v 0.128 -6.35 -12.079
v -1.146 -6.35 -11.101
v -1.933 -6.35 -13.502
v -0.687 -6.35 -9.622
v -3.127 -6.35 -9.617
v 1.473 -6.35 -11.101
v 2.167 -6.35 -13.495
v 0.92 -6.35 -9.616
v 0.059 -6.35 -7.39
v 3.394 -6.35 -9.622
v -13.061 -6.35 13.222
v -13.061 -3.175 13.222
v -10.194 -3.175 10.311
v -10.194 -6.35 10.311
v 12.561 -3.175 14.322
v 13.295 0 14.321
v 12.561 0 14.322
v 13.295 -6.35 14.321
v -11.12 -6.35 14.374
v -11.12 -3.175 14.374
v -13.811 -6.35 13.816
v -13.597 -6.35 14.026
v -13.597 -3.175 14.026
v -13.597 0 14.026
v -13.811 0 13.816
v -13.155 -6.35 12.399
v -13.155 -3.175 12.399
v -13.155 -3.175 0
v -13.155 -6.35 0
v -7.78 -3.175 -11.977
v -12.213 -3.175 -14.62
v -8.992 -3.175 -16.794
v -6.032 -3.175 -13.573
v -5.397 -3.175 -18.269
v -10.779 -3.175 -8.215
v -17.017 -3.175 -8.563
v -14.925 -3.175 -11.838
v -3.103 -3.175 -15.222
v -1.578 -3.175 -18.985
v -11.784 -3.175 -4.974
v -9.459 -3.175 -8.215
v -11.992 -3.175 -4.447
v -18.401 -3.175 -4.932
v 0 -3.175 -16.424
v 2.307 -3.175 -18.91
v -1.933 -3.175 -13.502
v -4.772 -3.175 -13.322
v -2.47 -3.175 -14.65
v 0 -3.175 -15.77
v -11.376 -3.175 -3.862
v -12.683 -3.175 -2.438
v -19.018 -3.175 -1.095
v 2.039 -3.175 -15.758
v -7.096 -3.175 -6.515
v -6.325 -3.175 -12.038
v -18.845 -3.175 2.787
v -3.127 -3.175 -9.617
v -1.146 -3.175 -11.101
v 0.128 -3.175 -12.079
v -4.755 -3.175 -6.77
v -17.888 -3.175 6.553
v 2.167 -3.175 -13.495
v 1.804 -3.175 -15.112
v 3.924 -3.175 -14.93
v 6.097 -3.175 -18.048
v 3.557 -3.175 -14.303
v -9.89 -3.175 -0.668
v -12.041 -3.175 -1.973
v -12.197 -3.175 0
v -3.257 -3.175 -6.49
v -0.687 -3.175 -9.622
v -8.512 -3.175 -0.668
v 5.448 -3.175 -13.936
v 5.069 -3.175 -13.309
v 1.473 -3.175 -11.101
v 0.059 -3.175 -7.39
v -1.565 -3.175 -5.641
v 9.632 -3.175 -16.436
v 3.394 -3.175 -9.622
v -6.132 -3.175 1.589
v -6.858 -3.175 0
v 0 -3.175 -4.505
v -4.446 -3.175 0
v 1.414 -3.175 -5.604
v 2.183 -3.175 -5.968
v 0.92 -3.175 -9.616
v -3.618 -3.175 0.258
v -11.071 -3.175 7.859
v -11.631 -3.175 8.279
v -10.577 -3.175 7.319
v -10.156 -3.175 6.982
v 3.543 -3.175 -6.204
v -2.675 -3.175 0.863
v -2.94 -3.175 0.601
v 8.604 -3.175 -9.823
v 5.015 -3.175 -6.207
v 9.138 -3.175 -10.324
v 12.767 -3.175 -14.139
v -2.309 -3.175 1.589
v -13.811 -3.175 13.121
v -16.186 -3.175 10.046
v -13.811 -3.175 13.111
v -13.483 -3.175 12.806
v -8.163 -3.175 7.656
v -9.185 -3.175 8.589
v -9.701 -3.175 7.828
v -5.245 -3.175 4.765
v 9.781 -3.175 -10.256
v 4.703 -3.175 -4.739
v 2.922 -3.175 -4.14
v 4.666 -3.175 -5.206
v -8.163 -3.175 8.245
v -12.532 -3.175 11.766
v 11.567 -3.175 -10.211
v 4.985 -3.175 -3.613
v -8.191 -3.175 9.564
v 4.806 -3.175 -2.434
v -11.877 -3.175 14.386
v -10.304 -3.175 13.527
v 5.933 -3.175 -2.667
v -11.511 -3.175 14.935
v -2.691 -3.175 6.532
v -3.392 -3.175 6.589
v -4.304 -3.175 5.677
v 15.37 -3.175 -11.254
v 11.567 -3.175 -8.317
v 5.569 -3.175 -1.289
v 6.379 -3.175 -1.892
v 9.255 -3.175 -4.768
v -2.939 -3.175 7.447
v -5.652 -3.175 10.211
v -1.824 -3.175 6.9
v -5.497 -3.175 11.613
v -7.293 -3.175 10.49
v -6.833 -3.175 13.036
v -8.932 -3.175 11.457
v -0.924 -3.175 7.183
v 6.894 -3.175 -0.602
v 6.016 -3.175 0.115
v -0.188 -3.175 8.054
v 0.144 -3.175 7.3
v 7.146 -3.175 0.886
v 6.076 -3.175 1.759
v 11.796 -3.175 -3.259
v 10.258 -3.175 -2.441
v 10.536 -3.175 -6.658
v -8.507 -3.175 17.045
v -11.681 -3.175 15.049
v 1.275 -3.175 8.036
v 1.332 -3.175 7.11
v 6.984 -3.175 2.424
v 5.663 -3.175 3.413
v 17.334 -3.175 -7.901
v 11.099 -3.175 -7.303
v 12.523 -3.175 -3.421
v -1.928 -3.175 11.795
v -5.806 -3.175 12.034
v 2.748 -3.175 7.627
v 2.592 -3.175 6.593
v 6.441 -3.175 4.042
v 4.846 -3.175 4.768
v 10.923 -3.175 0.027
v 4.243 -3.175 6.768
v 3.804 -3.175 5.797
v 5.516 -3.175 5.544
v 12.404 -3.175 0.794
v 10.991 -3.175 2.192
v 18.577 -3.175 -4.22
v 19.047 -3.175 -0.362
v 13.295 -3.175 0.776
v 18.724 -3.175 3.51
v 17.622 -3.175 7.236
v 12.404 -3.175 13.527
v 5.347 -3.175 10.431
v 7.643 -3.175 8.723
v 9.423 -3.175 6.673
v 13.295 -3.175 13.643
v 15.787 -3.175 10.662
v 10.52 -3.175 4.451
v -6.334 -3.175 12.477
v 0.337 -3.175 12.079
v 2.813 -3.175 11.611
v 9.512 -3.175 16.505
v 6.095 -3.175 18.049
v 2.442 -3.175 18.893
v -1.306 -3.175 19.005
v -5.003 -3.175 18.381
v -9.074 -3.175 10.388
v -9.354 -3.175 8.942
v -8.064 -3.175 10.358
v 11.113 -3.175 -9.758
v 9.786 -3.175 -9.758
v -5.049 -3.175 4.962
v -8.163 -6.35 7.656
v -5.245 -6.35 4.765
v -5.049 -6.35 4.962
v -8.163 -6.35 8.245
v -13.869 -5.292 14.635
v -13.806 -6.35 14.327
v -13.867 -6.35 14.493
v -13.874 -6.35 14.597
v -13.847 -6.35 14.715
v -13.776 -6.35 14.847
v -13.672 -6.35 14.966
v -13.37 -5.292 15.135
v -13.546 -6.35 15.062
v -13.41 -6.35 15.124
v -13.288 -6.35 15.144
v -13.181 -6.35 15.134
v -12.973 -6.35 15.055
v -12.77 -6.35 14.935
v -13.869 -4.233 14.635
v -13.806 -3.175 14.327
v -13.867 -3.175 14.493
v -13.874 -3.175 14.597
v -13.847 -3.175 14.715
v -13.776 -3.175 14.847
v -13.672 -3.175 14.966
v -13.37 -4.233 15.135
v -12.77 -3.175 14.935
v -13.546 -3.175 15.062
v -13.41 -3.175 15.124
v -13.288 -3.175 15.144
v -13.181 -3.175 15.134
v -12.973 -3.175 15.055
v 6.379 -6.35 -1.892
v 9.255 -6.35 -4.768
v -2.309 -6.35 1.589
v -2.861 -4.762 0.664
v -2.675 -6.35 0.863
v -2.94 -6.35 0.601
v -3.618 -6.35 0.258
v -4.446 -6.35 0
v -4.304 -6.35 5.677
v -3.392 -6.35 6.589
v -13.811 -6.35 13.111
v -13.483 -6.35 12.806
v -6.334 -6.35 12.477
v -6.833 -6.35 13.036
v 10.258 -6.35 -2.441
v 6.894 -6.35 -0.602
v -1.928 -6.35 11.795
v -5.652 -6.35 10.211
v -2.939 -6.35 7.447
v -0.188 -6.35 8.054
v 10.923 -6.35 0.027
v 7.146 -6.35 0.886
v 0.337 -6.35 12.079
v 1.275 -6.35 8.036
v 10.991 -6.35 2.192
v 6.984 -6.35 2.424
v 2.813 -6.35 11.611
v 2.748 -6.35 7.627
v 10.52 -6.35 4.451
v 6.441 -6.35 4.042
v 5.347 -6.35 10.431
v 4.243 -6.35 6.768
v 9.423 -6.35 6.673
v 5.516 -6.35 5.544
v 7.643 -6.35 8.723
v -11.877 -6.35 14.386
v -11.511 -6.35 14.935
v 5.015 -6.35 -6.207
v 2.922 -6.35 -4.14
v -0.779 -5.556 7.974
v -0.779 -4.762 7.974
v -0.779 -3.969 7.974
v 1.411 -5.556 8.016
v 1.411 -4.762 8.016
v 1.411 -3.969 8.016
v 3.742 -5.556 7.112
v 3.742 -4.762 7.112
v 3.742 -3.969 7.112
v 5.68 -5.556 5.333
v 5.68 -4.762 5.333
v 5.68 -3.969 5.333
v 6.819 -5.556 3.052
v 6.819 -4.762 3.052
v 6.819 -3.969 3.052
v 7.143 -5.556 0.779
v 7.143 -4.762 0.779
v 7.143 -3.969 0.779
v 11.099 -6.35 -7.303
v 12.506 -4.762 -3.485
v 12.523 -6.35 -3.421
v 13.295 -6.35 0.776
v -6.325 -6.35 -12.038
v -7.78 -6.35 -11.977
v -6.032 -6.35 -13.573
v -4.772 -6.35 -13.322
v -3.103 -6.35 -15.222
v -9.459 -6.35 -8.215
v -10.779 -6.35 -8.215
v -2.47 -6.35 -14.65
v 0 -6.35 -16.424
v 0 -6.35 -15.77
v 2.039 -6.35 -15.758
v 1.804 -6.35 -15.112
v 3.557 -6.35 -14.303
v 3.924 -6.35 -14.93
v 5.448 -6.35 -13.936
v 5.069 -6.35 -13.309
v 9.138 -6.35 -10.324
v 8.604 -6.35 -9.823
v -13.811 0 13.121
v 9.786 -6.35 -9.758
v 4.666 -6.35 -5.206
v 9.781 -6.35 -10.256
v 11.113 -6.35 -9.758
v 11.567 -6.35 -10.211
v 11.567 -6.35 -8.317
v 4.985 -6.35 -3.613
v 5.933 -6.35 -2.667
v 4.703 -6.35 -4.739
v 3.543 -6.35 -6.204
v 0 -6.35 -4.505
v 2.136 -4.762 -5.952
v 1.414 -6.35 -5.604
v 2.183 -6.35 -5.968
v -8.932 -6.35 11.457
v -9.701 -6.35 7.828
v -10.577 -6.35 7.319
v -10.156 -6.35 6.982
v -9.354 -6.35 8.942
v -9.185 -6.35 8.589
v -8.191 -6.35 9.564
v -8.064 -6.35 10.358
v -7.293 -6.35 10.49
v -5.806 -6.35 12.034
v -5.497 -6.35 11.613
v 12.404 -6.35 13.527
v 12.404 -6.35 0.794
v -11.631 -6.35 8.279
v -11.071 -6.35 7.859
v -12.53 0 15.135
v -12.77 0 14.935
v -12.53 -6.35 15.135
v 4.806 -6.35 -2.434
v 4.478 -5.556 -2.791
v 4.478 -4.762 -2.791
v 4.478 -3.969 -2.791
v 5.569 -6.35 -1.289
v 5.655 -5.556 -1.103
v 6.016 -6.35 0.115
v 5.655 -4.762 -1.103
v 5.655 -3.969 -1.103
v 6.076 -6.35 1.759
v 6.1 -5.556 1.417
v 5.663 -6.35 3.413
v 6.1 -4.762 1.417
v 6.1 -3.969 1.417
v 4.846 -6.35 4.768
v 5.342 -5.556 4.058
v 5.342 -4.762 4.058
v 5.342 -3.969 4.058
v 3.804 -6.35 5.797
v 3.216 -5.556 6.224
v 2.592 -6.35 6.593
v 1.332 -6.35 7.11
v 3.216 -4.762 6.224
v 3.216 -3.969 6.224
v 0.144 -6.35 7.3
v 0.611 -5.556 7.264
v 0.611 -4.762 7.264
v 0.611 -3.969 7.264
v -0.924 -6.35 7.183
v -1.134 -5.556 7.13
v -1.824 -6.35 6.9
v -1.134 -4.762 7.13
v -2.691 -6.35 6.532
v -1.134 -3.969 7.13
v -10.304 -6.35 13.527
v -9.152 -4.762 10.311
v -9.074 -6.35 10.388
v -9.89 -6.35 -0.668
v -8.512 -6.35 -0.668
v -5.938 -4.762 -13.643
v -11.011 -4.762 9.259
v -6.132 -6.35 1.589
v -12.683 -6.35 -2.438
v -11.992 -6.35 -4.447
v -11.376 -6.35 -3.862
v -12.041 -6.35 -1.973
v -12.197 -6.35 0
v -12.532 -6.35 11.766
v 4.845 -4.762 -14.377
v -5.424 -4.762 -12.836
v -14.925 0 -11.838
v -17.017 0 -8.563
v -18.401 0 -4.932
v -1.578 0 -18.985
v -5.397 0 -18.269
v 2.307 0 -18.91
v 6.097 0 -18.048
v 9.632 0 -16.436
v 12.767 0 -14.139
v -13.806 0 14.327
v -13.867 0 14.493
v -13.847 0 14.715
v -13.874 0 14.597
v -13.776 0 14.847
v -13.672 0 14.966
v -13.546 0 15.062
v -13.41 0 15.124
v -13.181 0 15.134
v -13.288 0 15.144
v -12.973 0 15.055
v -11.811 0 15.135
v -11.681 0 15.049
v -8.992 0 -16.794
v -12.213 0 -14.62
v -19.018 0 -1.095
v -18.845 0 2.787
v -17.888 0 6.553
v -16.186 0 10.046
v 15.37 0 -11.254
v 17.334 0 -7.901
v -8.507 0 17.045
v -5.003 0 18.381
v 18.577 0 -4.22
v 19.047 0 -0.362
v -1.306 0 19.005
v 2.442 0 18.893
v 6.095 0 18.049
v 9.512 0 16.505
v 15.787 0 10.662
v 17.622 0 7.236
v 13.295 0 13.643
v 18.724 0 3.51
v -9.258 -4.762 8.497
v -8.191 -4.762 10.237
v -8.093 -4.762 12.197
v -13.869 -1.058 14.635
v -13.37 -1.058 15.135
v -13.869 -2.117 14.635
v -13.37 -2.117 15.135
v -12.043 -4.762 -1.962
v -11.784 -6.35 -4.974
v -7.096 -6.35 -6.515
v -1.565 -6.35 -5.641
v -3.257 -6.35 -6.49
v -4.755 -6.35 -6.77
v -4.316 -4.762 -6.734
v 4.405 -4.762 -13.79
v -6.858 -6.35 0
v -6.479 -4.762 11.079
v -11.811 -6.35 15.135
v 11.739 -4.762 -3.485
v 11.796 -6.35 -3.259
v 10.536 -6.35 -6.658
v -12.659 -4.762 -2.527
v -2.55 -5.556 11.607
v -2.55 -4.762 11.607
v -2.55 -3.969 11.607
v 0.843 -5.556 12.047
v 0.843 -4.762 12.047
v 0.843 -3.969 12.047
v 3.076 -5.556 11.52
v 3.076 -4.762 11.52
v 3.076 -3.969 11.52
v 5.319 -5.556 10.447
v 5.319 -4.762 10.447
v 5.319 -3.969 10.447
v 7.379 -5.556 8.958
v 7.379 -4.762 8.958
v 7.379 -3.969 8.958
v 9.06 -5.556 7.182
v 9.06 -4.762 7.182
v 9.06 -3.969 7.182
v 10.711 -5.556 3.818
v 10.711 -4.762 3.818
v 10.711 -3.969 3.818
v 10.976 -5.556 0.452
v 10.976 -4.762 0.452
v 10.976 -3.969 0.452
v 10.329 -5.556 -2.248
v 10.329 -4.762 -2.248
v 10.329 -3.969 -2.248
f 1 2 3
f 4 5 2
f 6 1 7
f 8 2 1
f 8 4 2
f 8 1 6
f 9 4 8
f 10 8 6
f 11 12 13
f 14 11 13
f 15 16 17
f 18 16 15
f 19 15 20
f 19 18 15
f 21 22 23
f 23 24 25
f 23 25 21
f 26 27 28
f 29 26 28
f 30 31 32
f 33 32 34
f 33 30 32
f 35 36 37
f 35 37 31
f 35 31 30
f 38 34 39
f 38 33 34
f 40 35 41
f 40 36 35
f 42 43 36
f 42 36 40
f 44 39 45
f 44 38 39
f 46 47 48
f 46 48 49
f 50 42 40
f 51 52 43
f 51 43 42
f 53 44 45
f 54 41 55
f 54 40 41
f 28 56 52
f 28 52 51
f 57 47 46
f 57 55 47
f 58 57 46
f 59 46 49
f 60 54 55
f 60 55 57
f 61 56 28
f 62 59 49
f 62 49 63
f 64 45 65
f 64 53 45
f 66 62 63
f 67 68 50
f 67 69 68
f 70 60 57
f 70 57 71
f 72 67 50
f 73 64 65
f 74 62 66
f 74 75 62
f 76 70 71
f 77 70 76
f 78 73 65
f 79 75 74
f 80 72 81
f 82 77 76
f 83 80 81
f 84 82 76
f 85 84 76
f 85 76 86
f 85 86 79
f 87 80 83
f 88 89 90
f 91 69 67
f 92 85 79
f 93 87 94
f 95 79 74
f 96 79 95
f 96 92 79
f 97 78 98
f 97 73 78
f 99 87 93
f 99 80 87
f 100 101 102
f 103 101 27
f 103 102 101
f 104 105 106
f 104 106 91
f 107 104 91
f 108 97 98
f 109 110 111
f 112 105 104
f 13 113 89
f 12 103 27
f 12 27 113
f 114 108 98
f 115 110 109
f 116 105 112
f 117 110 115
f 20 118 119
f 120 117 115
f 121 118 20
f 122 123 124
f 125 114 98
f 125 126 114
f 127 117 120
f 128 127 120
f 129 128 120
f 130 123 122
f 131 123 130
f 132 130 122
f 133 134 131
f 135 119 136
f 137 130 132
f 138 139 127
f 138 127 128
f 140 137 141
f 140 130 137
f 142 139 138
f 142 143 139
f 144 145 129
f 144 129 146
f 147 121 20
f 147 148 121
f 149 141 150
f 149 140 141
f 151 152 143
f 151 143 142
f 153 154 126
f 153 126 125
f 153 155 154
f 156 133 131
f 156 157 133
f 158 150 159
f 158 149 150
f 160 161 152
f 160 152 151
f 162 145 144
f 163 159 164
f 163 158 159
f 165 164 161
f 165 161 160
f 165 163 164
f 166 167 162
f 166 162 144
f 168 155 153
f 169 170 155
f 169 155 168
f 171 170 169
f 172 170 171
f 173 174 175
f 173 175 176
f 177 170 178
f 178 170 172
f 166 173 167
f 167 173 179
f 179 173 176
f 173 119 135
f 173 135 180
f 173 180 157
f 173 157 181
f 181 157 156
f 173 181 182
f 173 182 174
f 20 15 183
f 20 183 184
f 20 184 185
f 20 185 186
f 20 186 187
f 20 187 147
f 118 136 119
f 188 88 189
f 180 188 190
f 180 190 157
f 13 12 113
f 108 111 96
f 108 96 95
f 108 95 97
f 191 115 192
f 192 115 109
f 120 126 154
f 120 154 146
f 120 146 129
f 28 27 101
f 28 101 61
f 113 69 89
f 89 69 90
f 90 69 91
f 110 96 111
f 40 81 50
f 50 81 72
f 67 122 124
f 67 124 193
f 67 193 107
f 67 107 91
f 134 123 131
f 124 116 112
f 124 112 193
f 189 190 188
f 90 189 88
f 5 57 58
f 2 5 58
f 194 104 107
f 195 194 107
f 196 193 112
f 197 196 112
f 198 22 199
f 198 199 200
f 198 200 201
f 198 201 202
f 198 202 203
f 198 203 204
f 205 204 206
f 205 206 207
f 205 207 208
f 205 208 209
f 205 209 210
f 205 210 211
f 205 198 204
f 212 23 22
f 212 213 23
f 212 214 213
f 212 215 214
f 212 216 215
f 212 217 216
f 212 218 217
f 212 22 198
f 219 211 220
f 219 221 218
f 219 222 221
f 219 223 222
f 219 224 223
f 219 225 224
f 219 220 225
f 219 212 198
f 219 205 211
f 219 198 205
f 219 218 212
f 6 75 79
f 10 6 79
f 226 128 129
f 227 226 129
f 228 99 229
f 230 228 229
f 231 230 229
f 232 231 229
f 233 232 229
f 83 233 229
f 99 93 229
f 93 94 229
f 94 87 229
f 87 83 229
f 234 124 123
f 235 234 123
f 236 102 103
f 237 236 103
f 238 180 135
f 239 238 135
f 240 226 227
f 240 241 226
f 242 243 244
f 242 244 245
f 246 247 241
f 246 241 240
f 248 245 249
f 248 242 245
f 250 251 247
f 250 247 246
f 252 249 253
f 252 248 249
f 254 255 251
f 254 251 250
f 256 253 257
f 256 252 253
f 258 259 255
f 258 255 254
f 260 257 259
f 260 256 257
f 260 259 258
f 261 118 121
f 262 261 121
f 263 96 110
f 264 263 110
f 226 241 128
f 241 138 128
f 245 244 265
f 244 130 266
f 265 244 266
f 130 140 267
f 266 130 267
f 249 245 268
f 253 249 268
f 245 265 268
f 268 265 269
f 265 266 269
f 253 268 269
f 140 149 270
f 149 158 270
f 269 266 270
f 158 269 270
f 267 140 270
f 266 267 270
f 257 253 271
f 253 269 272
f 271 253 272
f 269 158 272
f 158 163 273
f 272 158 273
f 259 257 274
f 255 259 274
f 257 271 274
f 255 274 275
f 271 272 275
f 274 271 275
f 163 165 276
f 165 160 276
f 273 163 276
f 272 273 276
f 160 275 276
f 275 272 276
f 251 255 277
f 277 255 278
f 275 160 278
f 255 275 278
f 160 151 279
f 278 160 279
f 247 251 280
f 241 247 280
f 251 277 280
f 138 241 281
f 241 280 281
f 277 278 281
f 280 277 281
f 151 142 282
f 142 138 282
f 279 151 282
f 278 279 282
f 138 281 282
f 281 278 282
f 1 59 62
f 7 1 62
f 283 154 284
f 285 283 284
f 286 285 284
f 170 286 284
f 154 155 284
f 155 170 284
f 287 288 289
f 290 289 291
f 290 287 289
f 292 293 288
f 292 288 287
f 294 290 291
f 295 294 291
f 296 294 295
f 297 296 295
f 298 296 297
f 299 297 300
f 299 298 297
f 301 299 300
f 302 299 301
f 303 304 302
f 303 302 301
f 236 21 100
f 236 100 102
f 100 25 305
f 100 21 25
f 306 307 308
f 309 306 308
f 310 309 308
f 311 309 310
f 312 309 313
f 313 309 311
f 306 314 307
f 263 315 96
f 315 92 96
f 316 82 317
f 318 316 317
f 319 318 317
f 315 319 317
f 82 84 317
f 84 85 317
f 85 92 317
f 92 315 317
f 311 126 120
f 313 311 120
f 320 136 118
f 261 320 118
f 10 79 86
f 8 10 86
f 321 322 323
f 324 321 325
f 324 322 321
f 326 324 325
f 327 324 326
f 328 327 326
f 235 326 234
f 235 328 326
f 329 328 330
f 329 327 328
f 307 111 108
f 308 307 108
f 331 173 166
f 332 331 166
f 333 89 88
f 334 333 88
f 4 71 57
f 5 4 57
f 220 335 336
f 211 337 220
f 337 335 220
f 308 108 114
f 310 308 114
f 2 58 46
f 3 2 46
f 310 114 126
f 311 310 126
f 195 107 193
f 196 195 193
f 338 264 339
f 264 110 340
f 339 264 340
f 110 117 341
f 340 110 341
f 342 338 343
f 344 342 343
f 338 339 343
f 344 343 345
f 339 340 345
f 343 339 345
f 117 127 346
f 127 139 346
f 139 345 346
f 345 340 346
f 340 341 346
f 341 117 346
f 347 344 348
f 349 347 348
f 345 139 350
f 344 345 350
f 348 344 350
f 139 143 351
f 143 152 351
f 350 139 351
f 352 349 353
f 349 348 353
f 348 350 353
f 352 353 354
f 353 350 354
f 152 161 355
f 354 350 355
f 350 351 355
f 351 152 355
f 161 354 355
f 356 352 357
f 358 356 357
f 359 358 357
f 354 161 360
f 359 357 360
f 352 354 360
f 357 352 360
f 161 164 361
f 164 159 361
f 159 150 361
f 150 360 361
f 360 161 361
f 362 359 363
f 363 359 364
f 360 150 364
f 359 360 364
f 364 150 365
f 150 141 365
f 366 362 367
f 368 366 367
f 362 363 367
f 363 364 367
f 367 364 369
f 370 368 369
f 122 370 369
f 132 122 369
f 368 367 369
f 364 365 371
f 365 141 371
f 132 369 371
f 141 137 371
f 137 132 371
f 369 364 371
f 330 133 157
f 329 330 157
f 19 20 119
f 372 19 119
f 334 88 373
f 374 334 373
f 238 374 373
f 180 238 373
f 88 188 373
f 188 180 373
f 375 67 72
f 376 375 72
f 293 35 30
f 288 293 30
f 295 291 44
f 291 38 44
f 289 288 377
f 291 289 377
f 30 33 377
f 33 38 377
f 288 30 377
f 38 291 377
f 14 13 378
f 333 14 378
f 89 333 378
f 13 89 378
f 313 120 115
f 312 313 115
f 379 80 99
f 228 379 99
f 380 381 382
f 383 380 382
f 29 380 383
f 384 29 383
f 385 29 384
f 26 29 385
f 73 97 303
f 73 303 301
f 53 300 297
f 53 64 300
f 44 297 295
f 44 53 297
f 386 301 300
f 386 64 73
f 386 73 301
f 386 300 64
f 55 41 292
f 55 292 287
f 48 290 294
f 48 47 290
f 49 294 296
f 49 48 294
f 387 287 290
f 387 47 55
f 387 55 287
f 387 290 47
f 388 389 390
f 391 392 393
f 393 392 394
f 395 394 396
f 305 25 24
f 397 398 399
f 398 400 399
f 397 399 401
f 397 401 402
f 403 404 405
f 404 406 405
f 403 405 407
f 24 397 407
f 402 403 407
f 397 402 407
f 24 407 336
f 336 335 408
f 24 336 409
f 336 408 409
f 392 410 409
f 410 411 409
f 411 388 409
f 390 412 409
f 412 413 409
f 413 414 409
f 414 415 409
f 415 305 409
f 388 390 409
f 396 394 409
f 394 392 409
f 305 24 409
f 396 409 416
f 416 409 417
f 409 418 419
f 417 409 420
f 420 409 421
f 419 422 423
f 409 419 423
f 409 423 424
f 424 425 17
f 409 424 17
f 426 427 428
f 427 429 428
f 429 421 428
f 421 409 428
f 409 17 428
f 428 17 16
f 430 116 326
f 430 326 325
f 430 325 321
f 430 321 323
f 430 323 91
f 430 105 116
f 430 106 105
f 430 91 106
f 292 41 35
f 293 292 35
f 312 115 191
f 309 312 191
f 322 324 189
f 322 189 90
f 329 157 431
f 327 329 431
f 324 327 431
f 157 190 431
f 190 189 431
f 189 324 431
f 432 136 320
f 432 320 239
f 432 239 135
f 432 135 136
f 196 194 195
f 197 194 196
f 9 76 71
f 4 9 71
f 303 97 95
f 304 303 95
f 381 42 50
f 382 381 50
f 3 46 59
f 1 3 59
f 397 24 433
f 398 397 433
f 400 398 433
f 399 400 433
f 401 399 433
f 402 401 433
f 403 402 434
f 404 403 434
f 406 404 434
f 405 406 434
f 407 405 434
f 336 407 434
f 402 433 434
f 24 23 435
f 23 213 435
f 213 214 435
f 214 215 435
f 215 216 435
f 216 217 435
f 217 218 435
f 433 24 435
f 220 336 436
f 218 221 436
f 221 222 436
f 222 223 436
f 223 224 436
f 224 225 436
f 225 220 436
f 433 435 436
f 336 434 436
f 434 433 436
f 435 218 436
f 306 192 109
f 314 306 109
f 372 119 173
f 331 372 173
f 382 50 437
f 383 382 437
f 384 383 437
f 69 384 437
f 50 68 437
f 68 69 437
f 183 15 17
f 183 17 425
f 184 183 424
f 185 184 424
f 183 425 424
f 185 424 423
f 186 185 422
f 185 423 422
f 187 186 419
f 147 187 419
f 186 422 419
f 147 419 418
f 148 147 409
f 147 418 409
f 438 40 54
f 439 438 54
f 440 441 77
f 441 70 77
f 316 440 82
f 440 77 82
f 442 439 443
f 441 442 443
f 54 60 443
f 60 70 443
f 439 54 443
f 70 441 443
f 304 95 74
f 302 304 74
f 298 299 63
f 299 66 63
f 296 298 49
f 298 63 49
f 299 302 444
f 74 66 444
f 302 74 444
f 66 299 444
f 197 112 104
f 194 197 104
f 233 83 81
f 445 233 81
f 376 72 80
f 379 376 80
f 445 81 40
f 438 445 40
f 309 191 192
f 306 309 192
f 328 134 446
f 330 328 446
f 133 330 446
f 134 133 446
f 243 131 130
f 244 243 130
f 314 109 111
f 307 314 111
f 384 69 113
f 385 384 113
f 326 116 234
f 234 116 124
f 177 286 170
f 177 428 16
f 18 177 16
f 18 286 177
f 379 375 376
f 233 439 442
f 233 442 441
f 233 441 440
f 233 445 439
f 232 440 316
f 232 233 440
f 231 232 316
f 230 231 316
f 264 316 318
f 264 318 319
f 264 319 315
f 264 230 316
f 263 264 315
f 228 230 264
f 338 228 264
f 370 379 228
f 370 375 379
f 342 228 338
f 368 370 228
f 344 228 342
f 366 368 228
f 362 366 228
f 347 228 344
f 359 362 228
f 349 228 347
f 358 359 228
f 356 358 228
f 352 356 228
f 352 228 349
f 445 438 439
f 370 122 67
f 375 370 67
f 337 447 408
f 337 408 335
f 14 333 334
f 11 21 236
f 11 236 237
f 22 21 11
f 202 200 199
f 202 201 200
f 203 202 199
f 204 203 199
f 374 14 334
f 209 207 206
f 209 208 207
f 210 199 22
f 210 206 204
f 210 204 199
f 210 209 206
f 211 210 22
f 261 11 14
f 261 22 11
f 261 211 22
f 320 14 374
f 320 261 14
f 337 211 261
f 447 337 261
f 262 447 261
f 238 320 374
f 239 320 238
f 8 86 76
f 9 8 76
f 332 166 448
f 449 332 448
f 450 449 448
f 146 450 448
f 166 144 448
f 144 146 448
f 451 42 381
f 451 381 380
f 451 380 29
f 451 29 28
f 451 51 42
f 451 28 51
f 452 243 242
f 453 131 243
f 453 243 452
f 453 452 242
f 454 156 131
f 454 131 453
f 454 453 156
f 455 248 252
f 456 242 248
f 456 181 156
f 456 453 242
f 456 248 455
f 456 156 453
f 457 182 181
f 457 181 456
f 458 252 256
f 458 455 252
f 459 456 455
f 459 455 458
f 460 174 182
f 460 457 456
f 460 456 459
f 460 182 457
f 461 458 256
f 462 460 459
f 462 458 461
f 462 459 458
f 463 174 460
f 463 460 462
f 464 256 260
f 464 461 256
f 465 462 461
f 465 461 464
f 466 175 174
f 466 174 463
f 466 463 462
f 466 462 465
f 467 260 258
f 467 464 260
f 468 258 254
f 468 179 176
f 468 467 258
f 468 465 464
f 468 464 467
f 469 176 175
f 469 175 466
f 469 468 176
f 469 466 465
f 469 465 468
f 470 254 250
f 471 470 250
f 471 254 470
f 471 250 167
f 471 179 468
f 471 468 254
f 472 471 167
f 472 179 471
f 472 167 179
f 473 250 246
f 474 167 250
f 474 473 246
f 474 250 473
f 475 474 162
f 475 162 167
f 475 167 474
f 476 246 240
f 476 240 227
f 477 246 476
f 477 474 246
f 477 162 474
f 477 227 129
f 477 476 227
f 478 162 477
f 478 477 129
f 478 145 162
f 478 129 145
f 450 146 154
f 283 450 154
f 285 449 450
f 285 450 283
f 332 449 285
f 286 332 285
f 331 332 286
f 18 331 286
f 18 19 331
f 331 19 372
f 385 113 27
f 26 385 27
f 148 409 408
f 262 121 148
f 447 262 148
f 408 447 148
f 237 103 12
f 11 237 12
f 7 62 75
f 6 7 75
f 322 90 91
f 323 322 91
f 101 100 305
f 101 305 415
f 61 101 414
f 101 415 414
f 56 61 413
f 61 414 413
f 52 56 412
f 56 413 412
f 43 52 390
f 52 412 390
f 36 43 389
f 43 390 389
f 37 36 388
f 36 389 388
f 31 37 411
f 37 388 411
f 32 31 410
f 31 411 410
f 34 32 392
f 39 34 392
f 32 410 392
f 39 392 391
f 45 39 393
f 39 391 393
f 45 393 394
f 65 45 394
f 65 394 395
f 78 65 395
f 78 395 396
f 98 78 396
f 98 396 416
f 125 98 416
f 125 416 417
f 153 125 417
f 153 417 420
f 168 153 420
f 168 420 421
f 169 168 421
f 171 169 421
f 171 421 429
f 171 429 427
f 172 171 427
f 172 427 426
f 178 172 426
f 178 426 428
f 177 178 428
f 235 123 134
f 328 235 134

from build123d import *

# Parameters (mm, degrees)
F0_R          = 19.05
F1_DEPTH      = 3.175
F3_DEPTH      = 3.175
F3_DEPTH_BACK = 3.175


with BuildPart() as f1:
    # F0 (on Front) → F1 (new body)
    with BuildSketch(Plane.XZ):
        Circle(F0_R)
    extrude(amount=F1_DEPTH)

    # F2 (on face) → F3 (join, two sides)
    with BuildSketch(Plane.XZ.offset(3.175)) as f3_sk:
        with BuildLine():
            Line((13.2951065898, 14.3205206841), (-11.1195538193, 14.3741192296))
            Line((-11.1195538193, 14.3741192296), (-10.3040672839, 13.5272685438))
            Line((-10.3040672839, 13.5272685438), (12.4042537063, 13.5272685438))
            Line((12.4042537063, 13.5272685438), (12.4042537063, 0.7942219963))
            add(Edge.make_bspline(
                [(12.4042537063, 0.7942219963), (12.2437335062, -0.6935312294), (11.9411104332, -3.4983399235), (10.9847031297, -5.6485725407), (10.5356024578, -6.6582583822)],
                knots=[0, 0, 0, 0, 0.5304294831, 1, 1, 1, 1], degree=3))
            Line((10.5356024578, -6.6582583822), (11.0988598317, -7.3030013591))
            add(Edge.make_bspline(
                [(11.0988598317, -7.3030013591), (11.6204761786, -6.0557843594), (12.6803886436, -3.521467994), (13.0880620978, -0.6713659701), (13.2951065898, 0.7761109737)],
                knots=[0, 0, 0, 0, 0.4921315337, 1, 1, 1, 1], degree=3))
            Line((13.2951065898, 0.7761109737), (13.2951065898, 14.3205206841))
        make_face()
        Polygon((-0.6866836248, -9.621998817), (-3.1270722393, -9.6166413277), (-1.1461181566, -11.1010298133), (-1.9328042399, -13.5020688176), (0.1275643008, -12.078541331), (2.1668851841, -13.4953176603), (1.4733931748, -11.1010298133), (3.3938813927, -9.6218636439), (0.9196144529, -9.6164317802), (0.0594901867, -7.3895342648), align=None)
        Polygon((9.7805182455, -10.2559360764), (11.5665001795, -10.2110812441), (11.5665001795, -8.3170095459), (5.9328516945, -2.6671725791), (4.9845642127, -3.6127429321), (11.1126137586, -9.7584016382), (9.7857490182, -9.7584016382), (4.7025149688, -4.7393189743), (4.6662185341, -5.2061798051), align=None)
        with BuildLine():
            Line((5.0151818607, -6.2073378134), (2.9217640404, -4.1403393261))
            add(Edge.make_bspline(
                [(2.9217640404, -4.1403393261), (4.0017596573, -3.2783505651), (6.2967614913, -1.4466155502), (6.3046824324, 4.5741096828), (0.6642850808, 8.0186176921), (-1.6742123718, 6.9825088021), (-2.6909445878, 6.5320292488)],
                knots=[0, 0, 0, 0, 0.2371028445, 0.503845992, 0.7842820981, 1, 1, 1, 1], degree=3))
            Line((-2.6909445878, 6.5320292488), (-9.8898978904, -0.6679674261))
            Line((-9.8898978904, -0.6679674261), (-8.5116093978, -0.6679674261))
            Line((-8.5116093978, -0.6679674261), (-6.13187678, 1.5893031363))
            Line((-6.13187678, 1.5893031363), (-2.3093123455, 1.5893031363))
            add(Edge.make_bspline(
                [(-2.3093123455, 1.5893031363), (-2.4412960331, 1.2516102423), (-2.7400240864, 0.4872859334), (-3.8346557693, 0.1745585357), (-4.445658531, 0)],
                knots=[0, 0, 0, 0, 0.441818859, 1, 1, 1, 1], degree=3))
            Line((-4.445658531, 0), (-6.857663393, 0))
            Line((-6.857663393, 0), (-11.7843858898, -4.9744602293))
            add(Edge.make_bspline(
                [(-11.7843858898, -4.9744602293), (-9.1052590566, -5.9842742459), (-4.2944262342, -7.7975689191), (-1.3186032332, -5.5161550663), (0, -4.5052482747)],
                knots=[0, 0, 0, 0, 0.5568946027, 1, 1, 1, 1], degree=3))
            add(Edge.make_bspline(
                [(0, -4.5052482747), (0.6645308371, -5.0850922819), (2.0325680841, -6.2787888796), (4.0022715592, -6.2316029467), (5.0151818607, -6.2073378134)],
                knots=[0, 0, 0, 0, 0.48575493, 1, 1, 1, 1], degree=3))
        make_face()
        with BuildLine():
            Line((9.138203226, -10.324401781), (8.6039779708, -9.8225530237))
            add(Edge.make_bspline(
                [(8.6039779708, -9.8225530237), (7.2581361134, -11.3018518624), (4.6817260383, -14.1337450832), (1.5133218063, -15.2414152892), (0, -15.7704707235)],
                knots=[0, 0, 0, 0, 0.5223709806, 1, 1, 1, 1], degree=3))
            add(Edge.make_bspline(
                [(-9.4586806372, -8.2151796669), (-8.2283692319, -9.8966299336), (-5.7644876665, -13.2639841641), (-1.9231894023, -14.9342388384), (0, -15.7704707235)],
                knots=[0, 0, 0, 0, 0.4993386949, 1, 1, 1, 1], degree=3))
            Line((-9.4586806372, -8.2151796669), (-10.7790241018, -8.2151796669))
            add(Edge.make_bspline(
                [(-10.7790241018, -8.2151796669), (-9.2866257772, -10.216307173), (-6.422821017, -14.1998498946), (-1.9977948837, -15.6756193291), (0, -16.4241865277)],
                knots=[0, 0, 0, 0, 0.5129628819, 1, 1, 1, 1], degree=3))
            add(Edge.make_bspline(
                [(9.138203226, -10.324401781), (7.6101712009, -11.8742374182), (5.1667983891, -14.7564398611), (1.7739776455, -15.8896886405), (0, -16.4241865277)],
                knots=[0, 0, 0, 0, 0.5144292418, 1, 1, 1, 1], degree=3))
        make_face()
        with BuildLine():
            Line((6.3793524168, -1.8924199976), (9.2547759414, -4.7678421251))
            add(Edge.make_bspline(
                [(-5.6524286047, 10.2112814784), (-3.6168299799, 11.2475901318), (0.8400975189, 13.5165799408), (10.0967712781, 7.8999192805), (11.6439949159, 0.4259003835), (10.018497176, -3.1076462689), (9.2547759414, -4.7678421251)],
                knots=[0, 0, 0, 0, 0.2433038431, 0.5327118892, 0.7804501082, 1, 1, 1, 1], degree=3))
            Line((-5.6524286047, 10.2112814784), (-2.9393755831, 7.4468469247))
            add(Edge.make_bspline(
                [(-2.9393755831, 7.4468469247), (-1.502485499, 7.851908623), (1.4748090248, 8.691212888), (6.2073016389, 5.7823119551), (7.5729609076, 0.7932677253), (6.7397473926, -1.0815105835), (6.3793524168, -1.8924199976)],
                knots=[0, 0, 0, 0, 0.255622974, 0.5296611682, 0.7965614469, 1, 1, 1, 1], degree=3))
        make_face()
        with BuildLine():
            Line((-3.3923503943, 6.5891323611), (-7.2932774201, 10.4900589213))
            add(Edge.make_bspline(
                [(-7.2932774201, 10.4900589213), (-7.0315208484, 10.6933025832), (-6.4937056941, 11.1108948549), (-5.835183803, 11.4424450599), (-5.4971668869, 11.6126285866)],
                knots=[0, 0, 0, 0, 0.4867035999, 1, 1, 1, 1], degree=3))
            Line((-5.4971668869, 11.6126285866), (-5.8058733121, 12.0335919783))
            add(Edge.make_bspline(
                [(-5.8058733121, 12.0335919783), (-6.6216145688, 11.4978026508), (-8.3538851706, 10.3600250858), (-9.8076282699, 8.3711164696), (-10.57679113, 7.3188021779)],
                knots=[0, 0, 0, 0, 0.4709086767, 1, 1, 1, 1], degree=3))
            Line((-10.57679113, 7.3188021779), (-10.1558286697, 6.9820312783))
            add(Edge.make_bspline(
                [(-8.1913326934, 9.5639401115), (-8.5656748556, 9.2353572907), (-9.3445869881, 8.5516588682), (-9.8785080222, 7.5186039785), (-10.1558286697, 6.9820312783)],
                knots=[0, 0, 0, 0, 0.4805961373, 1, 1, 1, 1], degree=3))
            Line((-8.1913326934, 9.5639401115), (-4.3044373822, 5.6770452643))
            Line((-4.3044373822, 5.6770452643), (-3.3923503943, 6.5891323611))
        make_face()
        Polygon((-5.0493629472, 4.9620792635), (-8.1632686779, 8.2449214533), (-8.1632686779, 7.6555726118), (-5.2445889451, 4.7649578191), align=None)
        with BuildLine():
            Line((-13.060814701, 13.2216596976), (-10.1942410693, 10.310985148))
            add(Edge.make_bspline(
                [(-10.1942410693, 10.310985148), (-10.4796394205, 9.9599556602), (-11.0312334616, 9.2815152529), (-11.4355277717, 8.6053887276), (-11.6306375712, 8.2790944725)],
                knots=[0, 0, 0, 0, 0.5174065165, 1, 1, 1, 1], degree=3))
            Line((-11.6306375712, 8.2790944725), (-11.0709676519, 7.8593418002))
            add(Edge.make_bspline(
                [(-11.0709676519, 7.8593418002), (-10.4892649761, 8.7107849431), (-9.2860247818, 10.4719778261), (-7.3393330178, 11.7938171812), (-6.3337632455, 12.4766174704)],
                knots=[0, 0, 0, 0, 0.4834468451, 1, 1, 1, 1], degree=3))
            Line((-6.3337632455, 12.4766174704), (-6.8334685639, 13.0362873897))
            add(Edge.make_bspline(
                [(-8.9322291315, 11.4572187886), (-8.6711328955, 11.7051084023), (-8.1063637602, 12.2413107045), (-7.2785688232, 12.7583035228), (-6.8334685639, 13.0362873897)],
                knots=[0, 0, 0, 0, 0.4623061346, 1, 1, 1, 1], degree=3))
            Line((-8.9322291315, 11.4572187886), (-11.8766472151, 14.3862600113))
            Line((-11.8766472151, 14.3862600113), (-11.5107083693, 14.935166575))
            Line((-11.5107083693, 14.935166575), (-11.8105309084, 15.1350488886))
            Line((-11.8105309084, 15.1350488886), (-12.5301061198, 15.1350488886))
            Line((-12.5301061198, 15.1350488886), (-12.7699645236, 14.935166575))
            add(Edge.make_bspline(
                [(-13.5973577846, 14.0257730544), (-13.7529213261, 14.2245779674), (-14.0633906595, 14.629918389), (-13.3650961838, 15.3086328914), (-12.9646191681, 15.0573192984), (-12.7699645236, 14.935166575)],
                knots=[0.0055616399, 0.0055616399, 0.0055616399, 0.0055616399, 0.3351525481, 0.6768462626, 1, 1, 1, 1], degree=3))
            Line((-13.5973577846, 14.0257730544), (-13.8105340302, 13.8158267364))
            Line((-13.8105340302, 13.8158267364), (-13.8105340302, 13.1114069372))
            Line((-13.8105340302, 13.1114069372), (-13.483288508, 12.8055869782))
            Line((-13.483288508, 12.8055869782), (-13.060814701, 13.2216596976))
        make_face()
        with BuildLine():
            Line((-13.1551567465, 12.3992469162), (-13.1551567465, 11.7663224228))
            Line((-13.1551567465, 11.7663224228), (-13.1551567465, 0))
            add(Edge.make_bspline(
                [(-11.9918715209, -4.4467356056), (-12.2321727364, -3.8322497133), (-12.7429395262, -2.5261431838), (-13.0124455989, -0.8745602441), (-13.1551567465, 0)],
                knots=[0, 0, 0, 0, 0.4704714955, 1, 1, 1, 1], degree=3))
            Line((-11.9918715209, -4.4467356056), (-11.3757159561, -3.8618131075))
            add(Edge.make_bspline(
                [(-11.3757159561, -3.8618131075), (-11.6411017383, -3.2356494914), (-12.168849425, -1.9904569373), (-12.1878234395, -0.6609463785), (-12.1972560883, 0)],
                knots=[0, 0, 0, 0, 0.5028648895, 1, 1, 1, 1], degree=3))
            Line((-12.1972560883, 0), (-12.5318219721, 11.7663224228))
            Line((-12.5318219721, 11.7663224228), (-13.1551567465, 12.3992469162))
        make_face()
    extrude(amount=F3_DEPTH)
    extrude(f3_sk.sketch, amount=-F3_DEPTH_BACK)


solid = f1.part
